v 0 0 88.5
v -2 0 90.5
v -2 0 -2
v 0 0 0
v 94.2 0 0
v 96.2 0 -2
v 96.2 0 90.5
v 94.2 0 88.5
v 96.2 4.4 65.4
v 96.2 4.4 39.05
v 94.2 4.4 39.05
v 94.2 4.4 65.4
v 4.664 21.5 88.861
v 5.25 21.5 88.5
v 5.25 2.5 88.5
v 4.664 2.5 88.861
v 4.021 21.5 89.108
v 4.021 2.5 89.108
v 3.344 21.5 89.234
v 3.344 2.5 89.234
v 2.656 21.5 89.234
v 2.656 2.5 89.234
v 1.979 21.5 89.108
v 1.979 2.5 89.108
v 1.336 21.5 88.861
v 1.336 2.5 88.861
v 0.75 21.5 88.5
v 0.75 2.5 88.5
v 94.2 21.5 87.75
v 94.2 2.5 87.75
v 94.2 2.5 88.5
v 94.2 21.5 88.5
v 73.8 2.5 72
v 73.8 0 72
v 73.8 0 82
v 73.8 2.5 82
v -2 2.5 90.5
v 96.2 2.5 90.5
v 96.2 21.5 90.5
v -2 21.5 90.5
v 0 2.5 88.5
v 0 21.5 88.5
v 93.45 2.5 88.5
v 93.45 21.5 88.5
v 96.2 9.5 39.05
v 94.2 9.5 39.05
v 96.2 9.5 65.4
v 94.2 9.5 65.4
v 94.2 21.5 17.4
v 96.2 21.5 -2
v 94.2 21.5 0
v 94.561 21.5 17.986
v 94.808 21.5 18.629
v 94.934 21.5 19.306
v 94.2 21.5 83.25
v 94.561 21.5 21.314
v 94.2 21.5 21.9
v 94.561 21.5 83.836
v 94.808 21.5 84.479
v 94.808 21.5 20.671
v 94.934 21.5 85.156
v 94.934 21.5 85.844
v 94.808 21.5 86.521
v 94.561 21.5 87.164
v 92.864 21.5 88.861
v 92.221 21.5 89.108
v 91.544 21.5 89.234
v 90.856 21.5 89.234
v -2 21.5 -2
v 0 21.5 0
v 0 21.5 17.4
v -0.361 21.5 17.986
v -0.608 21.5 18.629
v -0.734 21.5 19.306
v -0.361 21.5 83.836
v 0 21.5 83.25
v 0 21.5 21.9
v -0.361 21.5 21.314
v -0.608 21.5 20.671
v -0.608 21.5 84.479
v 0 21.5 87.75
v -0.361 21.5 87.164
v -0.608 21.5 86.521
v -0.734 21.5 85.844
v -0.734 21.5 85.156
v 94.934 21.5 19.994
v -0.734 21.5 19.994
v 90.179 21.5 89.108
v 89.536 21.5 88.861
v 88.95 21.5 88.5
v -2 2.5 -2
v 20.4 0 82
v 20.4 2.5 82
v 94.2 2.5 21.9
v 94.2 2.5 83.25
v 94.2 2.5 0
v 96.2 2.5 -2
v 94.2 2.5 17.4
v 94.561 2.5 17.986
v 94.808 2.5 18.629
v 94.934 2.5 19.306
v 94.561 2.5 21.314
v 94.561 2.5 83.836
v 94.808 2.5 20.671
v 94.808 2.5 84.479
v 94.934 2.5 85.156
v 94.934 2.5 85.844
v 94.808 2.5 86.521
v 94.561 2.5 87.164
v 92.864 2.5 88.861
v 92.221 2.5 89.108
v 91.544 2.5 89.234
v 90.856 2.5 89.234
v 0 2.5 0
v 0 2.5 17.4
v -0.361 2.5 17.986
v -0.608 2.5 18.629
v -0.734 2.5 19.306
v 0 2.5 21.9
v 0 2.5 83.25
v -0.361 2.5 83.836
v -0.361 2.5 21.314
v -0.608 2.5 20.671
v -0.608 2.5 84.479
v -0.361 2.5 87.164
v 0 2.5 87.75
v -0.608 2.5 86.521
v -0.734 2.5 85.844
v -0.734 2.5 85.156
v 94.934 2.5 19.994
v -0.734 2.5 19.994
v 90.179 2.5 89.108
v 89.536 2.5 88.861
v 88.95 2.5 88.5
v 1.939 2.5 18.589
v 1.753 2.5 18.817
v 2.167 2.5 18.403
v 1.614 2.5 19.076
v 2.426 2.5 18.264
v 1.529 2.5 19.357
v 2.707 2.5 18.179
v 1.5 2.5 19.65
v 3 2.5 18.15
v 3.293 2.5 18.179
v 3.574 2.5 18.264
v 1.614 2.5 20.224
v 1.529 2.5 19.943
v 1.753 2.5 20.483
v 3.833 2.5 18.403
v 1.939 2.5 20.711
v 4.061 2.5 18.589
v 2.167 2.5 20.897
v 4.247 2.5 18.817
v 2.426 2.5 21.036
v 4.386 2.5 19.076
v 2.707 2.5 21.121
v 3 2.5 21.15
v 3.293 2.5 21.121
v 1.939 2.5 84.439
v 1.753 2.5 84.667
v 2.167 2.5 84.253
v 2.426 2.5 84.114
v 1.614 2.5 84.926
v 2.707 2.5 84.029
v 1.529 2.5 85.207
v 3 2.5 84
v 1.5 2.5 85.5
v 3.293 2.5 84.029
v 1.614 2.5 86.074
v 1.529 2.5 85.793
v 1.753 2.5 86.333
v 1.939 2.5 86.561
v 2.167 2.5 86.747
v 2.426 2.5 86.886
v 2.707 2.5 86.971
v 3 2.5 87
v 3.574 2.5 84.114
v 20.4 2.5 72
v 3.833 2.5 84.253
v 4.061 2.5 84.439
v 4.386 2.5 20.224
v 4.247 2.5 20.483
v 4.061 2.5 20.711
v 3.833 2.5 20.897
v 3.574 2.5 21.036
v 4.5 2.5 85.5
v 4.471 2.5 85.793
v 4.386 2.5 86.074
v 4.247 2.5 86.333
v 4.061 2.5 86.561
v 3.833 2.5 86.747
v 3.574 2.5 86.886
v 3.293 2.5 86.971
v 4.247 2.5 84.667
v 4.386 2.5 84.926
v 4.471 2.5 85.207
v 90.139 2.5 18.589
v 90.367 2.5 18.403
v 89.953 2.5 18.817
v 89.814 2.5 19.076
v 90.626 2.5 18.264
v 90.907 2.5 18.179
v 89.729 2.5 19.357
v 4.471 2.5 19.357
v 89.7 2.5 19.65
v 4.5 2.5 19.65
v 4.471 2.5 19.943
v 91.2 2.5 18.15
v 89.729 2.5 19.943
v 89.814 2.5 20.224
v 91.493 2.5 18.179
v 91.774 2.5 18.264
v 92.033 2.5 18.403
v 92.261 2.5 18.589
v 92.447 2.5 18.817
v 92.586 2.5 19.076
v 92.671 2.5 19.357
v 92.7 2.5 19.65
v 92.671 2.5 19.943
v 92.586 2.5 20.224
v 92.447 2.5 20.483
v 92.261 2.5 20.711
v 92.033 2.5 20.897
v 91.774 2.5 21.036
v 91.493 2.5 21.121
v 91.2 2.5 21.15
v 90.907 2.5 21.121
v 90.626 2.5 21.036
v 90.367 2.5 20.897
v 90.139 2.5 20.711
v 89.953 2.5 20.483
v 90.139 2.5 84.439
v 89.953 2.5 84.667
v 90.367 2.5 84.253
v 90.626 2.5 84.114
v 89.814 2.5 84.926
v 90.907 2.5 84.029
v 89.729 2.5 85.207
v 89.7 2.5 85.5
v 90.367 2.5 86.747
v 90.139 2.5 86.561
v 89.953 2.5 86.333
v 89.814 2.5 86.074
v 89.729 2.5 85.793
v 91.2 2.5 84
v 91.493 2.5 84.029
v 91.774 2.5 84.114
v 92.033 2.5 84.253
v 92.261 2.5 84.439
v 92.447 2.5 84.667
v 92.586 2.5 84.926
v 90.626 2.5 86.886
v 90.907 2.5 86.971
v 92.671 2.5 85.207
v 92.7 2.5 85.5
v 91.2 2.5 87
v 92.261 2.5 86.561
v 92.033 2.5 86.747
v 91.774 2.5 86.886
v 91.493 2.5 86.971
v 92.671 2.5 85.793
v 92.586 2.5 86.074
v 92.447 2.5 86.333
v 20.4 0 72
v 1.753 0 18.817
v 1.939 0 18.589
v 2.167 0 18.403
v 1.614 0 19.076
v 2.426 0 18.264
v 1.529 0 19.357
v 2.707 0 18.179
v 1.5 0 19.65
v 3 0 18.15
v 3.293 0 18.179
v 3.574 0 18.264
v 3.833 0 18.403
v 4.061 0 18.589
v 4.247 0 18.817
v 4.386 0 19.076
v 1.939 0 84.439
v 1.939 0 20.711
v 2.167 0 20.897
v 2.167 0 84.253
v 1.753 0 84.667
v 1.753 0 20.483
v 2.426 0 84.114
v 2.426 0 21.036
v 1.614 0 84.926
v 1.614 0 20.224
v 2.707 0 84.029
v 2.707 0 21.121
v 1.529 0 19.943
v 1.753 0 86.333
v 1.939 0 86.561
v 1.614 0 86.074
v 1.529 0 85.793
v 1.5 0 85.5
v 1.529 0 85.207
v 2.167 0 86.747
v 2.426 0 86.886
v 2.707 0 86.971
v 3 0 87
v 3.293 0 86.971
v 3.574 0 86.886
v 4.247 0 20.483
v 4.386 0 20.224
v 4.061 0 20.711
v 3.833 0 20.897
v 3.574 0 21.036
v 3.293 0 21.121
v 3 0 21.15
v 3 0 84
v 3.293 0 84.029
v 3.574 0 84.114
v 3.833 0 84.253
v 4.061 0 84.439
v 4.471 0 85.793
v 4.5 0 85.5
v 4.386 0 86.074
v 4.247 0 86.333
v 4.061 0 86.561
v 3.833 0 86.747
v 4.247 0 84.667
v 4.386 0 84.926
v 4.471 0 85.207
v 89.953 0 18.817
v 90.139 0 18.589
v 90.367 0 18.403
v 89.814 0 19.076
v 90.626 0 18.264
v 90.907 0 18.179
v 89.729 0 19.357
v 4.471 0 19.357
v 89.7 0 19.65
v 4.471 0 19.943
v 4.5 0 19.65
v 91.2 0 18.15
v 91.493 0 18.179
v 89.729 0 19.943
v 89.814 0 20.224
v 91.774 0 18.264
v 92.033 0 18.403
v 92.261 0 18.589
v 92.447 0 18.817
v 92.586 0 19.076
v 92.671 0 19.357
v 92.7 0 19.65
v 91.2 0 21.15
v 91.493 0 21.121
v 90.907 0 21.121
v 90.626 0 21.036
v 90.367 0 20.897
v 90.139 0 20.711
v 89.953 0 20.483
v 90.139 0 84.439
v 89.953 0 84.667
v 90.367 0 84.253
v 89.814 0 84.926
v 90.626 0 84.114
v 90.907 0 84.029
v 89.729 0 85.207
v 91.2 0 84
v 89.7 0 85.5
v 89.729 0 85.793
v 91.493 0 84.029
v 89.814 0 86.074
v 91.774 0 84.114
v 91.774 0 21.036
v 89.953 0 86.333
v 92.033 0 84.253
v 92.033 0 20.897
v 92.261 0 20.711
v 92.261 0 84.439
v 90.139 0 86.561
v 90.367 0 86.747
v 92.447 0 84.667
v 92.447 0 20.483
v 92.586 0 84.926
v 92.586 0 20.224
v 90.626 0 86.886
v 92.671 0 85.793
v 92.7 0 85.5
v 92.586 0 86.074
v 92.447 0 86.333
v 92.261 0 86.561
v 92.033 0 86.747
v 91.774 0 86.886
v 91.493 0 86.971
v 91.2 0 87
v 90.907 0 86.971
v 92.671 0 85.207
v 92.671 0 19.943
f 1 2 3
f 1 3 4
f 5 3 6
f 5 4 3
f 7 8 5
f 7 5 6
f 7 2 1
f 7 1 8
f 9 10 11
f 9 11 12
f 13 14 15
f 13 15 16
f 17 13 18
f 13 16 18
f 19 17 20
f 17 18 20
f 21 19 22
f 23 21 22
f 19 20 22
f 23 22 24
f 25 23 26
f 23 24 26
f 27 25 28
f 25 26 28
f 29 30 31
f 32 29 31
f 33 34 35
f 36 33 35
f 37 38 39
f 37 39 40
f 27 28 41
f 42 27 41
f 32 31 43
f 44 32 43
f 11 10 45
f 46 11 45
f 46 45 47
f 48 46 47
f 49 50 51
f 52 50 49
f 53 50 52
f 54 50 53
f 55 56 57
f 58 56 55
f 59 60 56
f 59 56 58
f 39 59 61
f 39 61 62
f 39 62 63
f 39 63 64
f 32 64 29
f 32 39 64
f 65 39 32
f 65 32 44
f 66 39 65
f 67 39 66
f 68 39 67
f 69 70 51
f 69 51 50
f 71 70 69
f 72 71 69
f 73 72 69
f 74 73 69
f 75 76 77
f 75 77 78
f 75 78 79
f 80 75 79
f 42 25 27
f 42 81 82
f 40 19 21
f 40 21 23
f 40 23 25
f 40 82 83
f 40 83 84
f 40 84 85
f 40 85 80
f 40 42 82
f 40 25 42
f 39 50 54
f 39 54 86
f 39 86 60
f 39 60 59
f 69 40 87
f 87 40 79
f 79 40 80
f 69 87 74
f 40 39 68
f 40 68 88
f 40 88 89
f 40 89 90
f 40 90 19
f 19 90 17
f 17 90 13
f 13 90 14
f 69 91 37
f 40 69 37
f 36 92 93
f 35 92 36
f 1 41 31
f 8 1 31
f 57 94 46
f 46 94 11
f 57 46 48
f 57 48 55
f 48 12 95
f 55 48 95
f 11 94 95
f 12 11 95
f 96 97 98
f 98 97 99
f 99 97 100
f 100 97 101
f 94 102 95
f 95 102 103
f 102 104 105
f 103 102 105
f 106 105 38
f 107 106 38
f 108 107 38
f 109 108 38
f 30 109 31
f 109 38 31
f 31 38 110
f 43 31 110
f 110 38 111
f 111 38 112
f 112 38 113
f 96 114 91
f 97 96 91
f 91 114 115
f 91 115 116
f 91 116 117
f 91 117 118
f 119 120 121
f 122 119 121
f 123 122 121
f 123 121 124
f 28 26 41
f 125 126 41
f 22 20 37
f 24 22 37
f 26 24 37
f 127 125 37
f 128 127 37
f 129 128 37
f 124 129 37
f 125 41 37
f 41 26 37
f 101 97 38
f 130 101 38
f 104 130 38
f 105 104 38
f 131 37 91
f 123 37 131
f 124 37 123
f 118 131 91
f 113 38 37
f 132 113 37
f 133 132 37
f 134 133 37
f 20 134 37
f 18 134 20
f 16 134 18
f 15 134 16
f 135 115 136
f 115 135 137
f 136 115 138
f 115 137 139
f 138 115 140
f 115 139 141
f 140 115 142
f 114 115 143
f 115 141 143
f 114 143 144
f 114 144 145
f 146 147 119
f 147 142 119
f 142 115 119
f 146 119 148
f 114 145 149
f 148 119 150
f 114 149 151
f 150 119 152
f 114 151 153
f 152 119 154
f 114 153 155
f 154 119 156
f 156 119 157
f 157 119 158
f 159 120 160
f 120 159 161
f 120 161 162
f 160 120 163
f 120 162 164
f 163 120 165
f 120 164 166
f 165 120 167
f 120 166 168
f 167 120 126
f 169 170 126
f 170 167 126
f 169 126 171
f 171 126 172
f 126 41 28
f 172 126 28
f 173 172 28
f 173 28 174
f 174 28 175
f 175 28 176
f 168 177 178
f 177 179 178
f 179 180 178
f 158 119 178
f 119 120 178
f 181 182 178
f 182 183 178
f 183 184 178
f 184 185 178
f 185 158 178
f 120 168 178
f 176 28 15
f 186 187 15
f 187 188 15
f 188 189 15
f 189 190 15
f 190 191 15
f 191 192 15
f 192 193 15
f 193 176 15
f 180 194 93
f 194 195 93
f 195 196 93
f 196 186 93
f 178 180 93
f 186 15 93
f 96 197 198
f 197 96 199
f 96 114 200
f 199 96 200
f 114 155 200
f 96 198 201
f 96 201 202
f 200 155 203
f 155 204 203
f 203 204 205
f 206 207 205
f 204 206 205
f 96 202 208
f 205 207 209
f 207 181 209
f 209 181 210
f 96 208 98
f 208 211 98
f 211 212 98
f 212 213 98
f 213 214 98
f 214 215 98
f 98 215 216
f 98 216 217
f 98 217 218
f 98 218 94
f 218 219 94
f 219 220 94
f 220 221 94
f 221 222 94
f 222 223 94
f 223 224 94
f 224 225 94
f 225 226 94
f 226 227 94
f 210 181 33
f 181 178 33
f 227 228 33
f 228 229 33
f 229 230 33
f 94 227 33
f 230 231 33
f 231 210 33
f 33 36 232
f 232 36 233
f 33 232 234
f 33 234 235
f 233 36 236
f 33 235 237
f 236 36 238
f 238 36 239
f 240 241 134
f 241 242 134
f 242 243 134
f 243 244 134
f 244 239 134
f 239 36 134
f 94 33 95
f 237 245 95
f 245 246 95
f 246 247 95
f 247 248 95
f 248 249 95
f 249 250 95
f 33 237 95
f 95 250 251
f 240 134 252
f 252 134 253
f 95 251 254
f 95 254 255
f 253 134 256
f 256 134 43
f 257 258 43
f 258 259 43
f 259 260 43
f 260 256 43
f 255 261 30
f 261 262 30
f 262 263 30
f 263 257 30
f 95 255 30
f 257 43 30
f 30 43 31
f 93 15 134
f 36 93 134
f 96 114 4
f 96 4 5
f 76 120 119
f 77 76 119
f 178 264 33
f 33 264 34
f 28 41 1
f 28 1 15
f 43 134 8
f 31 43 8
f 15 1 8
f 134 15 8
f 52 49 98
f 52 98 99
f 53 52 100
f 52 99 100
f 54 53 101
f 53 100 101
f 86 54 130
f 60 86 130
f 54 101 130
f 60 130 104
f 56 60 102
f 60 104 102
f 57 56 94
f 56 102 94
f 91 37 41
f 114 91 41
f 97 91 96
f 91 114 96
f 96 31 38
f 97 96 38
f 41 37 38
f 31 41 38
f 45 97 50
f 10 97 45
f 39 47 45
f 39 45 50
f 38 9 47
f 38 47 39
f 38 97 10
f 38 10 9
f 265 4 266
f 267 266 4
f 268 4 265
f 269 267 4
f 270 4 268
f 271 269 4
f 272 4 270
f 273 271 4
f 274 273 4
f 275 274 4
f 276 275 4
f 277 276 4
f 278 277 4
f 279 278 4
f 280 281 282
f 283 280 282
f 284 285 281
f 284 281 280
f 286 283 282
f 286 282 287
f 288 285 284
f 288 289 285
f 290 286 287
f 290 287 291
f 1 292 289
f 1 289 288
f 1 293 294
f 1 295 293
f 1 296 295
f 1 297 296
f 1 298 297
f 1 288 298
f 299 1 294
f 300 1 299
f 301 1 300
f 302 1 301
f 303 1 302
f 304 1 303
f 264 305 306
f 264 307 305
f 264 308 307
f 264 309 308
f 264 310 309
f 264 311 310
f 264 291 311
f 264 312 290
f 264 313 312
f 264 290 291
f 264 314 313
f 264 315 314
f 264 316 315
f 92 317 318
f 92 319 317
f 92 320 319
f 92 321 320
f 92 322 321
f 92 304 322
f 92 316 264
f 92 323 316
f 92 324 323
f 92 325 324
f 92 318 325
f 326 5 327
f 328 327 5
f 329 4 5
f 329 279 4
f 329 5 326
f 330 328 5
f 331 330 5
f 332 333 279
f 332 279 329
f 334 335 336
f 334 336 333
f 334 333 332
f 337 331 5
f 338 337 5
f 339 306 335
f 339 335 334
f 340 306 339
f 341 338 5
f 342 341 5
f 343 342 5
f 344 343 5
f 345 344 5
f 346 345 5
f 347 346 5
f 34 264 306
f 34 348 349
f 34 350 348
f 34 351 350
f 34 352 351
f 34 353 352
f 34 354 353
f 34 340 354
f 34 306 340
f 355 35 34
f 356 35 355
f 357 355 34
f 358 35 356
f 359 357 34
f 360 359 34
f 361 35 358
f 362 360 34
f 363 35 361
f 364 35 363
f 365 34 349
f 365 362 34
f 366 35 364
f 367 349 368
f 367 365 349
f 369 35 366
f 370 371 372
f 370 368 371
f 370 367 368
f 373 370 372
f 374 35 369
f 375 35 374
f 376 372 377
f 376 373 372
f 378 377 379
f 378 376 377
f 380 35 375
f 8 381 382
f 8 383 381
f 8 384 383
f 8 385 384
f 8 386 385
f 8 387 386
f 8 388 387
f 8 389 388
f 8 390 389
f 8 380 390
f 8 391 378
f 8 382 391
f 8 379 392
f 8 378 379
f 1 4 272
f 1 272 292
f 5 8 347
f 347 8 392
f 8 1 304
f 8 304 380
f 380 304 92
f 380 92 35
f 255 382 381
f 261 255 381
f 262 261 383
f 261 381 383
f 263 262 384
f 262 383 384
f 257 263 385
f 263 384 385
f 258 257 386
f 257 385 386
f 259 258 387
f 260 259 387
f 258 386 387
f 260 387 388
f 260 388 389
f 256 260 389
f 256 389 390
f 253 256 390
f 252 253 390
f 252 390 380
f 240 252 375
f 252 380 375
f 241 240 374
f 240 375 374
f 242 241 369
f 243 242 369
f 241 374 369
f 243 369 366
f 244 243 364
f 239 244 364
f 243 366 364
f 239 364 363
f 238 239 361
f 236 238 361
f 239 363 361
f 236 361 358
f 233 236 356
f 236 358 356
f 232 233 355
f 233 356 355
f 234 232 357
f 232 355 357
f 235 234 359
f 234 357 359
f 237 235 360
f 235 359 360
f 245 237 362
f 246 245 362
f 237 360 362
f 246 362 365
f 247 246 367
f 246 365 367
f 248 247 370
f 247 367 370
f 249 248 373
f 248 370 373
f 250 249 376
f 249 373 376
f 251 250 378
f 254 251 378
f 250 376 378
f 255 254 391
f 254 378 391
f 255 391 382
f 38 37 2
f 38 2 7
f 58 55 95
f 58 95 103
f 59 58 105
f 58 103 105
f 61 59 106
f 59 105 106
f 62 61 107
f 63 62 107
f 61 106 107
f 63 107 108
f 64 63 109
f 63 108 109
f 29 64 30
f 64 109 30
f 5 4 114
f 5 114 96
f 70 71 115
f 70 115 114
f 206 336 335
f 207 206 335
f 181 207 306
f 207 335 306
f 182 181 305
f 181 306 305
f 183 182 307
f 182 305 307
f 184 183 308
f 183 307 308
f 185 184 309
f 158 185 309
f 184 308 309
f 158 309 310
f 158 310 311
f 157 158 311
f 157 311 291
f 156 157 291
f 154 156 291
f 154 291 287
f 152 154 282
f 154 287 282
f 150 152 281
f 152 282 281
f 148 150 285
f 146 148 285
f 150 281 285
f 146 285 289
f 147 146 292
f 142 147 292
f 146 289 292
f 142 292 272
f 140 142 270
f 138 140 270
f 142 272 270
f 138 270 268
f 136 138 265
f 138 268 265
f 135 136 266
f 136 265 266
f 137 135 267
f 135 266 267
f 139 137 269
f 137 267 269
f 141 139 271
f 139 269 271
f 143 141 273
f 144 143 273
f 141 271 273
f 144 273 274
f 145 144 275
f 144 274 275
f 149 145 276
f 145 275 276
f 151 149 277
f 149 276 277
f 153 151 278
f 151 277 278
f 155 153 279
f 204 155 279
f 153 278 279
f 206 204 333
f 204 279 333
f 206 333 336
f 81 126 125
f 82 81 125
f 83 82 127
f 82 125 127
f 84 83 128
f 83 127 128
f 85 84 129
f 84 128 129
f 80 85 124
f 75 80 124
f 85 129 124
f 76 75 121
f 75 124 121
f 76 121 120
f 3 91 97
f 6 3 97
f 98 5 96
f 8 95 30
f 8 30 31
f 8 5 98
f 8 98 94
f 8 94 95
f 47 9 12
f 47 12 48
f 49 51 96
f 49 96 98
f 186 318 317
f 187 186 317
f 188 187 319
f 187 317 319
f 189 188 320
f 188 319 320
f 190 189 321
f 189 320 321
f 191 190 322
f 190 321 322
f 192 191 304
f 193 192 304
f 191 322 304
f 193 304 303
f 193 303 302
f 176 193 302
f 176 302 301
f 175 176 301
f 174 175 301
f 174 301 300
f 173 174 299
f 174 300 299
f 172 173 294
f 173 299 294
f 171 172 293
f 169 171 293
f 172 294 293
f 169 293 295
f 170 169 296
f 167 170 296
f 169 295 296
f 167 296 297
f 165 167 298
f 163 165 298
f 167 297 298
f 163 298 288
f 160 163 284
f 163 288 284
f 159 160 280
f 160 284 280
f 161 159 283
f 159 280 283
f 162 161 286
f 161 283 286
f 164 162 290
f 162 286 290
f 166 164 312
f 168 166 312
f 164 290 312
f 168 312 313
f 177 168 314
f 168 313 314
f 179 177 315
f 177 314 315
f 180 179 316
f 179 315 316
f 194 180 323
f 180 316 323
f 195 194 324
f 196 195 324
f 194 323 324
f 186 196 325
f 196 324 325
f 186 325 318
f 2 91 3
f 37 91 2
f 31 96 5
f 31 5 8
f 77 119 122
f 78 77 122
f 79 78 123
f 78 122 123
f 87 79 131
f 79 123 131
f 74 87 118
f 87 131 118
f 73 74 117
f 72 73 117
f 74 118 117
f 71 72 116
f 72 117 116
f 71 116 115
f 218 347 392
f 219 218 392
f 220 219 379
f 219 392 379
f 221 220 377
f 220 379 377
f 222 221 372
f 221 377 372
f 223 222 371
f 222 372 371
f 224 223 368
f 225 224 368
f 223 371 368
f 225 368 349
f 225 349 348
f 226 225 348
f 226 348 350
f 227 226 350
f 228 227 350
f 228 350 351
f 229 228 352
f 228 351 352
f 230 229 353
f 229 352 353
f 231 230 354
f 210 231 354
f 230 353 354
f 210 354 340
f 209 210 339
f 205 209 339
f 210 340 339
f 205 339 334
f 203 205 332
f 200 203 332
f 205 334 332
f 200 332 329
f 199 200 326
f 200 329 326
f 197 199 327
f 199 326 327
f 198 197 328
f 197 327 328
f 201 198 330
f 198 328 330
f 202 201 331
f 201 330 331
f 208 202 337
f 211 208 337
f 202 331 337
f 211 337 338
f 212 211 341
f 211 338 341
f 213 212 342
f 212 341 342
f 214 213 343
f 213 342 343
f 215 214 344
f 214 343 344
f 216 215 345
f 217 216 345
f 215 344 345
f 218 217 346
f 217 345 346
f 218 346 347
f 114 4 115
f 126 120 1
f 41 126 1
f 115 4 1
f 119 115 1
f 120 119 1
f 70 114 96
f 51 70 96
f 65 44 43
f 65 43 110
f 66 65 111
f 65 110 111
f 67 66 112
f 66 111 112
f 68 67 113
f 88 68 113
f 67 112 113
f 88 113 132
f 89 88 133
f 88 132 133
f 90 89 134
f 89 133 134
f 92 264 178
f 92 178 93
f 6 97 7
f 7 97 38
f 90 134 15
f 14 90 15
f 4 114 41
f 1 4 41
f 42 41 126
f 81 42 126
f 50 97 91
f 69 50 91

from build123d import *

# Parameters (mm, degrees)
F0_W     = 94.2
F0_H     = 88.5
F0_R     = 1.5
F0_W_2   = 53.4
F0_H_2   = 10
F1_DEPTH = 2.5
F2_W     = 98.2
F2_H     = 92.5
F3_DEPTH = 19
F4_W     = 98.2
F4_H     = 92.5
F4_W_2   = 94.2
F4_H_2   = 88.5
F5_DEPTH = 2.5
F6_W     = 5.1
F6_H     = 26.35
F7_DEPTH = 2.1


with BuildPart() as f1:
    # F0 (on Front) → F1 (new body)
    with BuildSketch(Plane.XZ):
        with Locations((47.1, 44.25)):
            Rectangle(F0_W, F0_H)
        with Locations((3, 19.65)):
            Circle(F0_R, mode=Mode.SUBTRACT)
        with Locations((91.2, 19.65)):
            Circle(F0_R, mode=Mode.SUBTRACT)
        with Locations((3, 85.5)):
            Circle(F0_R, mode=Mode.SUBTRACT)
        with Locations((47.1, 77)):
            Rectangle(F0_W_2, F0_H_2, mode=Mode.SUBTRACT)
        with Locations((91.2, 85.5)):
            Circle(F0_R, mode=Mode.SUBTRACT)
    extrude(amount=-F1_DEPTH)

    # F2 (on face) → F3 (join)
    with BuildSketch(Plane(origin=(0, 2.5, 0), x_dir=(-1, 0, 0), z_dir=(0, 1, 0))):
        with Locations((-47.1, 44.25)):
            Rectangle(F2_W, F2_H)
        with BuildLine():
            Line((-94.2, 87.75), (-94.2, 88.5))
            Line((-94.2, 88.5), (-93.45, 88.5))
            ThreePointArc((-93.45, 88.5), (-91.2, 89.25), (-88.95, 88.5))
            Line((-88.95, 88.5), (-5.25, 88.5))
            ThreePointArc((-5.25, 88.5), (-3, 89.25), (-0.75, 88.5))
            Line((-0.75, 88.5), (0, 88.5))
            Line((0, 88.5), (0, 87.75))
            ThreePointArc((0, 87.75), (0.75, 85.5), (0, 83.25))
            Line((0, 83.25), (0, 21.9))
            ThreePointArc((0, 21.9), (0.75, 19.65), (0, 17.4))
            Line((0, 17.4), (0, 0))
            Line((0, 0), (-94.2, 0))
            Line((-94.2, 0), (-94.2, 17.4))
            ThreePointArc((-94.2, 17.4), (-94.95, 19.65), (-94.2, 21.9))
            Line((-94.2, 21.9), (-94.2, 83.25))
            ThreePointArc((-94.2, 83.25), (-94.95, 85.5), (-94.2, 87.75))
        make_face(mode=Mode.SUBTRACT)
    extrude(amount=F3_DEPTH)

    # F6 (on face) → F7 (cut)
    with BuildSketch(Plane.YZ.offset(96.2)):
        with Locations((6.95, 52.225)):
            Rectangle(F6_W, F6_H)
    extrude(amount=-F7_DEPTH, mode=Mode.SUBTRACT)


with BuildPart() as f5:
    # F4 (on face) → F5 (new body)
    with BuildSketch(Plane.XZ.offset(-2.5)):
        with Locations((47.1, 44.25)):
            Rectangle(F4_W, F4_H)
        with Locations((47.1, 44.25)):
            Rectangle(F4_W_2, F4_H_2, mode=Mode.SUBTRACT)
    extrude(amount=F5_DEPTH)


solid = Compound([f1.part, f5.part])
